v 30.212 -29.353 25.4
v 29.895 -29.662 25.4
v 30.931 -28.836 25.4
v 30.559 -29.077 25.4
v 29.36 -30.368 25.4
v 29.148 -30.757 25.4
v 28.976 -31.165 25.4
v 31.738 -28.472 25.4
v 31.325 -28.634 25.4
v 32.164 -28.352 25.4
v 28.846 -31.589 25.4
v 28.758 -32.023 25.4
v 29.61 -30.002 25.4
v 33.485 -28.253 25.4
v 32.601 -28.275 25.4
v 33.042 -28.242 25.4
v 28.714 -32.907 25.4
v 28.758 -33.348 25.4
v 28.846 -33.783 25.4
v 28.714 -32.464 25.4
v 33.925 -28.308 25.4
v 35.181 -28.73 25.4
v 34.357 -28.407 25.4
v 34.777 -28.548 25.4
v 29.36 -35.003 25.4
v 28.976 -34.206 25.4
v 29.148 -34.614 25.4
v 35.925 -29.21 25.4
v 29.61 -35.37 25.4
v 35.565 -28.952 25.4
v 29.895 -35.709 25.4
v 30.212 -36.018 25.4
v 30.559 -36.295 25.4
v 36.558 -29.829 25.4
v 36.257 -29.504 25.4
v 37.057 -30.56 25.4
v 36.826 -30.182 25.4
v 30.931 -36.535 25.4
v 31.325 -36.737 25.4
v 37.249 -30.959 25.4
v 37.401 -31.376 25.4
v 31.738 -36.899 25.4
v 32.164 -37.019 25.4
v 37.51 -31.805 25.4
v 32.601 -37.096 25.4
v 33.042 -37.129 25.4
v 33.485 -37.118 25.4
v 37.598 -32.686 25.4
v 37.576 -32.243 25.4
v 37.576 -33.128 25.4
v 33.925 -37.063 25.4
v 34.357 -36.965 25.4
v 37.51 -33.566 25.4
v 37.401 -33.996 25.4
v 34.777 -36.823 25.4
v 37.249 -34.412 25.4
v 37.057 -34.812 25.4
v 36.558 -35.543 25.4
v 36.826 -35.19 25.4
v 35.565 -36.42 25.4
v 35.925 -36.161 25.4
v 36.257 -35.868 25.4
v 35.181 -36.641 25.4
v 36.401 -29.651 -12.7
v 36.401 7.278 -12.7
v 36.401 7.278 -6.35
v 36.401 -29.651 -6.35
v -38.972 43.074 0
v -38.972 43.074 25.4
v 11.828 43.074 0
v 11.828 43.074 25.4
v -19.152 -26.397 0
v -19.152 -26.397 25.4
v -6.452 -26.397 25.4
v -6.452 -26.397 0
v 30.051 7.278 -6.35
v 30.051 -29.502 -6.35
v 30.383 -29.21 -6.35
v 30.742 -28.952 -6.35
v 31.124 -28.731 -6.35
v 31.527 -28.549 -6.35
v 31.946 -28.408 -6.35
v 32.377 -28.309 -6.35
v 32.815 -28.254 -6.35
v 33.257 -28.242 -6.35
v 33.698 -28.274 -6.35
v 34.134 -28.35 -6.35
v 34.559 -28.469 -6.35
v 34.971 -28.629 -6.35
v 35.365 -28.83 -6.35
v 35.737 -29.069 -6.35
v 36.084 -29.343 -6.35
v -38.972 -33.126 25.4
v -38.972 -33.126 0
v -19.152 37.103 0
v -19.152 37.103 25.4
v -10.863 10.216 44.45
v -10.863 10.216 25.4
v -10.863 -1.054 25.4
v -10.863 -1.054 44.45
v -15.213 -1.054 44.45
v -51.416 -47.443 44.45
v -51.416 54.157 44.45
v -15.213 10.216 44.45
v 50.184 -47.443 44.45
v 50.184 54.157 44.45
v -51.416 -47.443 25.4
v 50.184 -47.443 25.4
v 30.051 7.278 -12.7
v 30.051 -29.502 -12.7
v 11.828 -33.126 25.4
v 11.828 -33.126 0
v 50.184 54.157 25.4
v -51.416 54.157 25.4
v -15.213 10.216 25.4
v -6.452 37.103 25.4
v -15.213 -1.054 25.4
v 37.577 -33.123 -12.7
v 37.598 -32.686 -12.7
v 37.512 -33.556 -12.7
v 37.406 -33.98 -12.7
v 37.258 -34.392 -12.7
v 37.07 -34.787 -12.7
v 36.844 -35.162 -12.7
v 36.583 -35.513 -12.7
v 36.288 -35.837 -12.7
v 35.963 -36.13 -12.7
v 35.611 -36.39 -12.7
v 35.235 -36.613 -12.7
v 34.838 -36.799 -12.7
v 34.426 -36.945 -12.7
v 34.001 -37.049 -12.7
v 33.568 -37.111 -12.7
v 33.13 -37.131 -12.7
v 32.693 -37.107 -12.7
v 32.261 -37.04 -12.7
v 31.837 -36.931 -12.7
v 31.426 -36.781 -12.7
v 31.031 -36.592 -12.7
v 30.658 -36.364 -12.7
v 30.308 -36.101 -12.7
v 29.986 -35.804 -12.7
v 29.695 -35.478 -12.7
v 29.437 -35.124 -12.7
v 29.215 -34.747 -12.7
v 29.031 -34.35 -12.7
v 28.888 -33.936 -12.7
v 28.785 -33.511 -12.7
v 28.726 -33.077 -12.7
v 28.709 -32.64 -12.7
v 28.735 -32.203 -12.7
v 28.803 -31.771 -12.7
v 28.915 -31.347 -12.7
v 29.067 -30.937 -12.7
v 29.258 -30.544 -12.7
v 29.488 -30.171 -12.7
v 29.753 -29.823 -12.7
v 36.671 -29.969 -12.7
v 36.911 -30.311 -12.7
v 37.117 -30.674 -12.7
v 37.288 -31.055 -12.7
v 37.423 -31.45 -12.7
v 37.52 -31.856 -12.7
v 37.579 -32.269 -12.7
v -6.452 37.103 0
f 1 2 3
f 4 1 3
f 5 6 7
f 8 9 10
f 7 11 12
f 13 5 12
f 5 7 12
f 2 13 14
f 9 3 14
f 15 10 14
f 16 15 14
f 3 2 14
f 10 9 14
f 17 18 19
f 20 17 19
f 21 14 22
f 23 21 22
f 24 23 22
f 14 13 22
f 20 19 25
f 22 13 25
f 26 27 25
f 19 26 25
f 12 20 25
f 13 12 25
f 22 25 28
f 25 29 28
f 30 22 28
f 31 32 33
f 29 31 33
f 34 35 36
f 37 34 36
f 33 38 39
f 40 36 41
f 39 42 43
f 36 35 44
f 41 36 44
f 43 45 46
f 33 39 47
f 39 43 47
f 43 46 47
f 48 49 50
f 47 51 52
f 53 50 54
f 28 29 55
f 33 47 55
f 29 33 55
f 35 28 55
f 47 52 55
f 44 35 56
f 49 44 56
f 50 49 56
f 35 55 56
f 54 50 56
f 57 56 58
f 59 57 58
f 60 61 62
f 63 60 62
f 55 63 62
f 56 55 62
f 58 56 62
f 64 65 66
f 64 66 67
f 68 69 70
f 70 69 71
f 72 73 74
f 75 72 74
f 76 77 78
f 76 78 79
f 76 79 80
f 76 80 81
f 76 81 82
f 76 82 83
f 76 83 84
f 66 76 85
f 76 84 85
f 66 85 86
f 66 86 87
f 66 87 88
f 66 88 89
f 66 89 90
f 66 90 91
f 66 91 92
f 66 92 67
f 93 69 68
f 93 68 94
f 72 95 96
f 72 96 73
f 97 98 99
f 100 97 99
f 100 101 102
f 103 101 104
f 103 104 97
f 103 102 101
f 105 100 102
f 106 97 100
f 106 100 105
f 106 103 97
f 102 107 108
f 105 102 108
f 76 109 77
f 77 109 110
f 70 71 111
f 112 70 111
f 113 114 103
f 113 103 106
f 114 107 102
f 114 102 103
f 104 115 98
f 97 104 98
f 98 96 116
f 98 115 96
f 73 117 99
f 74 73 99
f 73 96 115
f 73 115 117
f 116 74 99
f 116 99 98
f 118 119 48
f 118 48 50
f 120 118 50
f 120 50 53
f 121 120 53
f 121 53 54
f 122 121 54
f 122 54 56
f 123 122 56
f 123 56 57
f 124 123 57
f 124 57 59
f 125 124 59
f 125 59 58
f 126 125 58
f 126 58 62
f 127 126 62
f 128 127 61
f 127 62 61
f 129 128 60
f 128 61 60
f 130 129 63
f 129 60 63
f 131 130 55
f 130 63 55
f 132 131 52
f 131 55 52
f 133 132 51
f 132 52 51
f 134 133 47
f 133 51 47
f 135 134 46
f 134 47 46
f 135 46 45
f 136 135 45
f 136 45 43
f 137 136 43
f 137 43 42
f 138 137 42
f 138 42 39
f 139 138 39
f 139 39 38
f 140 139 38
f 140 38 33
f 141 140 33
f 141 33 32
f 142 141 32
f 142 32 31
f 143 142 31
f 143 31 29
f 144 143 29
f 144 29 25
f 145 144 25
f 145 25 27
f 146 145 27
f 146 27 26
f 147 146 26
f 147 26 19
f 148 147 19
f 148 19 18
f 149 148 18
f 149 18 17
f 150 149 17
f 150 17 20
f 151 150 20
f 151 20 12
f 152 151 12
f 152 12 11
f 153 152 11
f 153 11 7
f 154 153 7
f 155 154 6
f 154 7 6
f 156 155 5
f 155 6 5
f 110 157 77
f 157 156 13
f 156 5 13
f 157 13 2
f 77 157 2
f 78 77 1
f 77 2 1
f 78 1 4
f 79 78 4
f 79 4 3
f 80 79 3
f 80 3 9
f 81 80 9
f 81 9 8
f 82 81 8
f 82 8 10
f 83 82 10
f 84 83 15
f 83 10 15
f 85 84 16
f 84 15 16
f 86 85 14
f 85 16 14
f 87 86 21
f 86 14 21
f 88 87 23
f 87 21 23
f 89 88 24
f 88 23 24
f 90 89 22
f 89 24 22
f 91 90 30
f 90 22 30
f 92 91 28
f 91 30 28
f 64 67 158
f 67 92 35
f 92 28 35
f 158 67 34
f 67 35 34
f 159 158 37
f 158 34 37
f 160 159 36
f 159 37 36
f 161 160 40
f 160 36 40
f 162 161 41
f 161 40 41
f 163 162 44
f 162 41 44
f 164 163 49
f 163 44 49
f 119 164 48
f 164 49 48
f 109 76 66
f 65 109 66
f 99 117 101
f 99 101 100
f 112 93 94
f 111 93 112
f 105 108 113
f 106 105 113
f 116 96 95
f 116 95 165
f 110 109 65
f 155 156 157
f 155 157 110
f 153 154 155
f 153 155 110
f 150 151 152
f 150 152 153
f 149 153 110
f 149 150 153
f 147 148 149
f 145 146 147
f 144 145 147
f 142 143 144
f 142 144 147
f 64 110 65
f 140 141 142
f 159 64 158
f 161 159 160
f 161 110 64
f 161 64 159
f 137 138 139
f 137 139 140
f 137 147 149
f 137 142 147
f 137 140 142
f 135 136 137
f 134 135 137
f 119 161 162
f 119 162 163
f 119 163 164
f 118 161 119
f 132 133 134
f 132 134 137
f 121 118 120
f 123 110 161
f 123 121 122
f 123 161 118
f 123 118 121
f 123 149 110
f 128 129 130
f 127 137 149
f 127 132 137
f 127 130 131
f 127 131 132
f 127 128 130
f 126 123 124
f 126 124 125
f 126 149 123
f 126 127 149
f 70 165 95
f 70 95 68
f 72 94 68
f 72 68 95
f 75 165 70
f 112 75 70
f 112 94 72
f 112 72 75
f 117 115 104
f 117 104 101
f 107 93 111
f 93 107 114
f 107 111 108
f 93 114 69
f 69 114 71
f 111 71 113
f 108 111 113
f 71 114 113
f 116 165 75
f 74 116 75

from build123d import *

# Parameters (mm, degrees)
F1_W      = 101.6
F1_H      = 101.6
F2_DEPTH  = 19.05
F3_R      = 4.445
F4_DEPTH  = 38.1
F5_W      = 6.35
F5_H      = 38.1
F6_DEPTH  = 6.35
F7_W      = 50.8
F7_H      = 76.2
F8_DEPTH  = 25.4
F9_W      = 12.7
F9_H      = 63.5
F10_DEPTH = 25.4
F11_W     = 4.349544
F11_H     = 11.269192
F12_DEPTH = 25.4


with BuildPart() as f2:
    # F1 (on offset) → F2 (new body)
    with BuildSketch(Plane.XY.offset(25.4)):
        with Locations((-0.6163, 3.356868)):
            Rectangle(F1_W, F1_H)
    extrude(amount=F2_DEPTH)

    # F7 (on face) → F8 (join)
    with BuildSketch(Plane(origin=(0, 0, 25.4), x_dir=(1, 0, 0), z_dir=(0, 0, -1))):
        with Locations((-13.572001, -4.973551)):
            Rectangle(F7_W, F7_H)
    extrude(amount=F8_DEPTH)

    # F9 (on face) → F10 (cut)
    with BuildSketch(Plane(origin=(0, 0, 0), x_dir=(1, 0, 0), z_dir=(0, 0, -1))):
        with Locations((-12.801679, -5.35343)):
            Rectangle(F9_W, F9_H)
    extrude(amount=-F10_DEPTH, mode=Mode.SUBTRACT)

    # F11 (on face) → F12 (cut)
    with BuildSketch(Plane(origin=(0, 0, 25.4), x_dir=(1, 0, 0), z_dir=(0, 0, -1))):
        with Locations((-13.0379, -4.580913)):
            Rectangle(F11_W, F11_H)
    extrude(amount=-F12_DEPTH, mode=Mode.SUBTRACT)


with BuildPart() as f4:
    # F3 (on face) → F4 (new body)
    with BuildSketch(Plane(origin=(0, 0, 25.4), x_dir=(1, 0, 0), z_dir=(0, 0, -1))):
        with Locations((33.153266, 32.685717)):
            Circle(F3_R)
    extrude(amount=F4_DEPTH)

    # F5 (on face) → F6 (join)
    with BuildSketch(Plane(origin=(0, 0, -12.7), x_dir=(1, 0, 0), z_dir=(0, 0, -1))):
        with Locations((33.226073, 11.772308)):
            Rectangle(F5_W, F5_H)
    extrude(amount=-F6_DEPTH)


solid = Compound([f2.part, f4.part])
